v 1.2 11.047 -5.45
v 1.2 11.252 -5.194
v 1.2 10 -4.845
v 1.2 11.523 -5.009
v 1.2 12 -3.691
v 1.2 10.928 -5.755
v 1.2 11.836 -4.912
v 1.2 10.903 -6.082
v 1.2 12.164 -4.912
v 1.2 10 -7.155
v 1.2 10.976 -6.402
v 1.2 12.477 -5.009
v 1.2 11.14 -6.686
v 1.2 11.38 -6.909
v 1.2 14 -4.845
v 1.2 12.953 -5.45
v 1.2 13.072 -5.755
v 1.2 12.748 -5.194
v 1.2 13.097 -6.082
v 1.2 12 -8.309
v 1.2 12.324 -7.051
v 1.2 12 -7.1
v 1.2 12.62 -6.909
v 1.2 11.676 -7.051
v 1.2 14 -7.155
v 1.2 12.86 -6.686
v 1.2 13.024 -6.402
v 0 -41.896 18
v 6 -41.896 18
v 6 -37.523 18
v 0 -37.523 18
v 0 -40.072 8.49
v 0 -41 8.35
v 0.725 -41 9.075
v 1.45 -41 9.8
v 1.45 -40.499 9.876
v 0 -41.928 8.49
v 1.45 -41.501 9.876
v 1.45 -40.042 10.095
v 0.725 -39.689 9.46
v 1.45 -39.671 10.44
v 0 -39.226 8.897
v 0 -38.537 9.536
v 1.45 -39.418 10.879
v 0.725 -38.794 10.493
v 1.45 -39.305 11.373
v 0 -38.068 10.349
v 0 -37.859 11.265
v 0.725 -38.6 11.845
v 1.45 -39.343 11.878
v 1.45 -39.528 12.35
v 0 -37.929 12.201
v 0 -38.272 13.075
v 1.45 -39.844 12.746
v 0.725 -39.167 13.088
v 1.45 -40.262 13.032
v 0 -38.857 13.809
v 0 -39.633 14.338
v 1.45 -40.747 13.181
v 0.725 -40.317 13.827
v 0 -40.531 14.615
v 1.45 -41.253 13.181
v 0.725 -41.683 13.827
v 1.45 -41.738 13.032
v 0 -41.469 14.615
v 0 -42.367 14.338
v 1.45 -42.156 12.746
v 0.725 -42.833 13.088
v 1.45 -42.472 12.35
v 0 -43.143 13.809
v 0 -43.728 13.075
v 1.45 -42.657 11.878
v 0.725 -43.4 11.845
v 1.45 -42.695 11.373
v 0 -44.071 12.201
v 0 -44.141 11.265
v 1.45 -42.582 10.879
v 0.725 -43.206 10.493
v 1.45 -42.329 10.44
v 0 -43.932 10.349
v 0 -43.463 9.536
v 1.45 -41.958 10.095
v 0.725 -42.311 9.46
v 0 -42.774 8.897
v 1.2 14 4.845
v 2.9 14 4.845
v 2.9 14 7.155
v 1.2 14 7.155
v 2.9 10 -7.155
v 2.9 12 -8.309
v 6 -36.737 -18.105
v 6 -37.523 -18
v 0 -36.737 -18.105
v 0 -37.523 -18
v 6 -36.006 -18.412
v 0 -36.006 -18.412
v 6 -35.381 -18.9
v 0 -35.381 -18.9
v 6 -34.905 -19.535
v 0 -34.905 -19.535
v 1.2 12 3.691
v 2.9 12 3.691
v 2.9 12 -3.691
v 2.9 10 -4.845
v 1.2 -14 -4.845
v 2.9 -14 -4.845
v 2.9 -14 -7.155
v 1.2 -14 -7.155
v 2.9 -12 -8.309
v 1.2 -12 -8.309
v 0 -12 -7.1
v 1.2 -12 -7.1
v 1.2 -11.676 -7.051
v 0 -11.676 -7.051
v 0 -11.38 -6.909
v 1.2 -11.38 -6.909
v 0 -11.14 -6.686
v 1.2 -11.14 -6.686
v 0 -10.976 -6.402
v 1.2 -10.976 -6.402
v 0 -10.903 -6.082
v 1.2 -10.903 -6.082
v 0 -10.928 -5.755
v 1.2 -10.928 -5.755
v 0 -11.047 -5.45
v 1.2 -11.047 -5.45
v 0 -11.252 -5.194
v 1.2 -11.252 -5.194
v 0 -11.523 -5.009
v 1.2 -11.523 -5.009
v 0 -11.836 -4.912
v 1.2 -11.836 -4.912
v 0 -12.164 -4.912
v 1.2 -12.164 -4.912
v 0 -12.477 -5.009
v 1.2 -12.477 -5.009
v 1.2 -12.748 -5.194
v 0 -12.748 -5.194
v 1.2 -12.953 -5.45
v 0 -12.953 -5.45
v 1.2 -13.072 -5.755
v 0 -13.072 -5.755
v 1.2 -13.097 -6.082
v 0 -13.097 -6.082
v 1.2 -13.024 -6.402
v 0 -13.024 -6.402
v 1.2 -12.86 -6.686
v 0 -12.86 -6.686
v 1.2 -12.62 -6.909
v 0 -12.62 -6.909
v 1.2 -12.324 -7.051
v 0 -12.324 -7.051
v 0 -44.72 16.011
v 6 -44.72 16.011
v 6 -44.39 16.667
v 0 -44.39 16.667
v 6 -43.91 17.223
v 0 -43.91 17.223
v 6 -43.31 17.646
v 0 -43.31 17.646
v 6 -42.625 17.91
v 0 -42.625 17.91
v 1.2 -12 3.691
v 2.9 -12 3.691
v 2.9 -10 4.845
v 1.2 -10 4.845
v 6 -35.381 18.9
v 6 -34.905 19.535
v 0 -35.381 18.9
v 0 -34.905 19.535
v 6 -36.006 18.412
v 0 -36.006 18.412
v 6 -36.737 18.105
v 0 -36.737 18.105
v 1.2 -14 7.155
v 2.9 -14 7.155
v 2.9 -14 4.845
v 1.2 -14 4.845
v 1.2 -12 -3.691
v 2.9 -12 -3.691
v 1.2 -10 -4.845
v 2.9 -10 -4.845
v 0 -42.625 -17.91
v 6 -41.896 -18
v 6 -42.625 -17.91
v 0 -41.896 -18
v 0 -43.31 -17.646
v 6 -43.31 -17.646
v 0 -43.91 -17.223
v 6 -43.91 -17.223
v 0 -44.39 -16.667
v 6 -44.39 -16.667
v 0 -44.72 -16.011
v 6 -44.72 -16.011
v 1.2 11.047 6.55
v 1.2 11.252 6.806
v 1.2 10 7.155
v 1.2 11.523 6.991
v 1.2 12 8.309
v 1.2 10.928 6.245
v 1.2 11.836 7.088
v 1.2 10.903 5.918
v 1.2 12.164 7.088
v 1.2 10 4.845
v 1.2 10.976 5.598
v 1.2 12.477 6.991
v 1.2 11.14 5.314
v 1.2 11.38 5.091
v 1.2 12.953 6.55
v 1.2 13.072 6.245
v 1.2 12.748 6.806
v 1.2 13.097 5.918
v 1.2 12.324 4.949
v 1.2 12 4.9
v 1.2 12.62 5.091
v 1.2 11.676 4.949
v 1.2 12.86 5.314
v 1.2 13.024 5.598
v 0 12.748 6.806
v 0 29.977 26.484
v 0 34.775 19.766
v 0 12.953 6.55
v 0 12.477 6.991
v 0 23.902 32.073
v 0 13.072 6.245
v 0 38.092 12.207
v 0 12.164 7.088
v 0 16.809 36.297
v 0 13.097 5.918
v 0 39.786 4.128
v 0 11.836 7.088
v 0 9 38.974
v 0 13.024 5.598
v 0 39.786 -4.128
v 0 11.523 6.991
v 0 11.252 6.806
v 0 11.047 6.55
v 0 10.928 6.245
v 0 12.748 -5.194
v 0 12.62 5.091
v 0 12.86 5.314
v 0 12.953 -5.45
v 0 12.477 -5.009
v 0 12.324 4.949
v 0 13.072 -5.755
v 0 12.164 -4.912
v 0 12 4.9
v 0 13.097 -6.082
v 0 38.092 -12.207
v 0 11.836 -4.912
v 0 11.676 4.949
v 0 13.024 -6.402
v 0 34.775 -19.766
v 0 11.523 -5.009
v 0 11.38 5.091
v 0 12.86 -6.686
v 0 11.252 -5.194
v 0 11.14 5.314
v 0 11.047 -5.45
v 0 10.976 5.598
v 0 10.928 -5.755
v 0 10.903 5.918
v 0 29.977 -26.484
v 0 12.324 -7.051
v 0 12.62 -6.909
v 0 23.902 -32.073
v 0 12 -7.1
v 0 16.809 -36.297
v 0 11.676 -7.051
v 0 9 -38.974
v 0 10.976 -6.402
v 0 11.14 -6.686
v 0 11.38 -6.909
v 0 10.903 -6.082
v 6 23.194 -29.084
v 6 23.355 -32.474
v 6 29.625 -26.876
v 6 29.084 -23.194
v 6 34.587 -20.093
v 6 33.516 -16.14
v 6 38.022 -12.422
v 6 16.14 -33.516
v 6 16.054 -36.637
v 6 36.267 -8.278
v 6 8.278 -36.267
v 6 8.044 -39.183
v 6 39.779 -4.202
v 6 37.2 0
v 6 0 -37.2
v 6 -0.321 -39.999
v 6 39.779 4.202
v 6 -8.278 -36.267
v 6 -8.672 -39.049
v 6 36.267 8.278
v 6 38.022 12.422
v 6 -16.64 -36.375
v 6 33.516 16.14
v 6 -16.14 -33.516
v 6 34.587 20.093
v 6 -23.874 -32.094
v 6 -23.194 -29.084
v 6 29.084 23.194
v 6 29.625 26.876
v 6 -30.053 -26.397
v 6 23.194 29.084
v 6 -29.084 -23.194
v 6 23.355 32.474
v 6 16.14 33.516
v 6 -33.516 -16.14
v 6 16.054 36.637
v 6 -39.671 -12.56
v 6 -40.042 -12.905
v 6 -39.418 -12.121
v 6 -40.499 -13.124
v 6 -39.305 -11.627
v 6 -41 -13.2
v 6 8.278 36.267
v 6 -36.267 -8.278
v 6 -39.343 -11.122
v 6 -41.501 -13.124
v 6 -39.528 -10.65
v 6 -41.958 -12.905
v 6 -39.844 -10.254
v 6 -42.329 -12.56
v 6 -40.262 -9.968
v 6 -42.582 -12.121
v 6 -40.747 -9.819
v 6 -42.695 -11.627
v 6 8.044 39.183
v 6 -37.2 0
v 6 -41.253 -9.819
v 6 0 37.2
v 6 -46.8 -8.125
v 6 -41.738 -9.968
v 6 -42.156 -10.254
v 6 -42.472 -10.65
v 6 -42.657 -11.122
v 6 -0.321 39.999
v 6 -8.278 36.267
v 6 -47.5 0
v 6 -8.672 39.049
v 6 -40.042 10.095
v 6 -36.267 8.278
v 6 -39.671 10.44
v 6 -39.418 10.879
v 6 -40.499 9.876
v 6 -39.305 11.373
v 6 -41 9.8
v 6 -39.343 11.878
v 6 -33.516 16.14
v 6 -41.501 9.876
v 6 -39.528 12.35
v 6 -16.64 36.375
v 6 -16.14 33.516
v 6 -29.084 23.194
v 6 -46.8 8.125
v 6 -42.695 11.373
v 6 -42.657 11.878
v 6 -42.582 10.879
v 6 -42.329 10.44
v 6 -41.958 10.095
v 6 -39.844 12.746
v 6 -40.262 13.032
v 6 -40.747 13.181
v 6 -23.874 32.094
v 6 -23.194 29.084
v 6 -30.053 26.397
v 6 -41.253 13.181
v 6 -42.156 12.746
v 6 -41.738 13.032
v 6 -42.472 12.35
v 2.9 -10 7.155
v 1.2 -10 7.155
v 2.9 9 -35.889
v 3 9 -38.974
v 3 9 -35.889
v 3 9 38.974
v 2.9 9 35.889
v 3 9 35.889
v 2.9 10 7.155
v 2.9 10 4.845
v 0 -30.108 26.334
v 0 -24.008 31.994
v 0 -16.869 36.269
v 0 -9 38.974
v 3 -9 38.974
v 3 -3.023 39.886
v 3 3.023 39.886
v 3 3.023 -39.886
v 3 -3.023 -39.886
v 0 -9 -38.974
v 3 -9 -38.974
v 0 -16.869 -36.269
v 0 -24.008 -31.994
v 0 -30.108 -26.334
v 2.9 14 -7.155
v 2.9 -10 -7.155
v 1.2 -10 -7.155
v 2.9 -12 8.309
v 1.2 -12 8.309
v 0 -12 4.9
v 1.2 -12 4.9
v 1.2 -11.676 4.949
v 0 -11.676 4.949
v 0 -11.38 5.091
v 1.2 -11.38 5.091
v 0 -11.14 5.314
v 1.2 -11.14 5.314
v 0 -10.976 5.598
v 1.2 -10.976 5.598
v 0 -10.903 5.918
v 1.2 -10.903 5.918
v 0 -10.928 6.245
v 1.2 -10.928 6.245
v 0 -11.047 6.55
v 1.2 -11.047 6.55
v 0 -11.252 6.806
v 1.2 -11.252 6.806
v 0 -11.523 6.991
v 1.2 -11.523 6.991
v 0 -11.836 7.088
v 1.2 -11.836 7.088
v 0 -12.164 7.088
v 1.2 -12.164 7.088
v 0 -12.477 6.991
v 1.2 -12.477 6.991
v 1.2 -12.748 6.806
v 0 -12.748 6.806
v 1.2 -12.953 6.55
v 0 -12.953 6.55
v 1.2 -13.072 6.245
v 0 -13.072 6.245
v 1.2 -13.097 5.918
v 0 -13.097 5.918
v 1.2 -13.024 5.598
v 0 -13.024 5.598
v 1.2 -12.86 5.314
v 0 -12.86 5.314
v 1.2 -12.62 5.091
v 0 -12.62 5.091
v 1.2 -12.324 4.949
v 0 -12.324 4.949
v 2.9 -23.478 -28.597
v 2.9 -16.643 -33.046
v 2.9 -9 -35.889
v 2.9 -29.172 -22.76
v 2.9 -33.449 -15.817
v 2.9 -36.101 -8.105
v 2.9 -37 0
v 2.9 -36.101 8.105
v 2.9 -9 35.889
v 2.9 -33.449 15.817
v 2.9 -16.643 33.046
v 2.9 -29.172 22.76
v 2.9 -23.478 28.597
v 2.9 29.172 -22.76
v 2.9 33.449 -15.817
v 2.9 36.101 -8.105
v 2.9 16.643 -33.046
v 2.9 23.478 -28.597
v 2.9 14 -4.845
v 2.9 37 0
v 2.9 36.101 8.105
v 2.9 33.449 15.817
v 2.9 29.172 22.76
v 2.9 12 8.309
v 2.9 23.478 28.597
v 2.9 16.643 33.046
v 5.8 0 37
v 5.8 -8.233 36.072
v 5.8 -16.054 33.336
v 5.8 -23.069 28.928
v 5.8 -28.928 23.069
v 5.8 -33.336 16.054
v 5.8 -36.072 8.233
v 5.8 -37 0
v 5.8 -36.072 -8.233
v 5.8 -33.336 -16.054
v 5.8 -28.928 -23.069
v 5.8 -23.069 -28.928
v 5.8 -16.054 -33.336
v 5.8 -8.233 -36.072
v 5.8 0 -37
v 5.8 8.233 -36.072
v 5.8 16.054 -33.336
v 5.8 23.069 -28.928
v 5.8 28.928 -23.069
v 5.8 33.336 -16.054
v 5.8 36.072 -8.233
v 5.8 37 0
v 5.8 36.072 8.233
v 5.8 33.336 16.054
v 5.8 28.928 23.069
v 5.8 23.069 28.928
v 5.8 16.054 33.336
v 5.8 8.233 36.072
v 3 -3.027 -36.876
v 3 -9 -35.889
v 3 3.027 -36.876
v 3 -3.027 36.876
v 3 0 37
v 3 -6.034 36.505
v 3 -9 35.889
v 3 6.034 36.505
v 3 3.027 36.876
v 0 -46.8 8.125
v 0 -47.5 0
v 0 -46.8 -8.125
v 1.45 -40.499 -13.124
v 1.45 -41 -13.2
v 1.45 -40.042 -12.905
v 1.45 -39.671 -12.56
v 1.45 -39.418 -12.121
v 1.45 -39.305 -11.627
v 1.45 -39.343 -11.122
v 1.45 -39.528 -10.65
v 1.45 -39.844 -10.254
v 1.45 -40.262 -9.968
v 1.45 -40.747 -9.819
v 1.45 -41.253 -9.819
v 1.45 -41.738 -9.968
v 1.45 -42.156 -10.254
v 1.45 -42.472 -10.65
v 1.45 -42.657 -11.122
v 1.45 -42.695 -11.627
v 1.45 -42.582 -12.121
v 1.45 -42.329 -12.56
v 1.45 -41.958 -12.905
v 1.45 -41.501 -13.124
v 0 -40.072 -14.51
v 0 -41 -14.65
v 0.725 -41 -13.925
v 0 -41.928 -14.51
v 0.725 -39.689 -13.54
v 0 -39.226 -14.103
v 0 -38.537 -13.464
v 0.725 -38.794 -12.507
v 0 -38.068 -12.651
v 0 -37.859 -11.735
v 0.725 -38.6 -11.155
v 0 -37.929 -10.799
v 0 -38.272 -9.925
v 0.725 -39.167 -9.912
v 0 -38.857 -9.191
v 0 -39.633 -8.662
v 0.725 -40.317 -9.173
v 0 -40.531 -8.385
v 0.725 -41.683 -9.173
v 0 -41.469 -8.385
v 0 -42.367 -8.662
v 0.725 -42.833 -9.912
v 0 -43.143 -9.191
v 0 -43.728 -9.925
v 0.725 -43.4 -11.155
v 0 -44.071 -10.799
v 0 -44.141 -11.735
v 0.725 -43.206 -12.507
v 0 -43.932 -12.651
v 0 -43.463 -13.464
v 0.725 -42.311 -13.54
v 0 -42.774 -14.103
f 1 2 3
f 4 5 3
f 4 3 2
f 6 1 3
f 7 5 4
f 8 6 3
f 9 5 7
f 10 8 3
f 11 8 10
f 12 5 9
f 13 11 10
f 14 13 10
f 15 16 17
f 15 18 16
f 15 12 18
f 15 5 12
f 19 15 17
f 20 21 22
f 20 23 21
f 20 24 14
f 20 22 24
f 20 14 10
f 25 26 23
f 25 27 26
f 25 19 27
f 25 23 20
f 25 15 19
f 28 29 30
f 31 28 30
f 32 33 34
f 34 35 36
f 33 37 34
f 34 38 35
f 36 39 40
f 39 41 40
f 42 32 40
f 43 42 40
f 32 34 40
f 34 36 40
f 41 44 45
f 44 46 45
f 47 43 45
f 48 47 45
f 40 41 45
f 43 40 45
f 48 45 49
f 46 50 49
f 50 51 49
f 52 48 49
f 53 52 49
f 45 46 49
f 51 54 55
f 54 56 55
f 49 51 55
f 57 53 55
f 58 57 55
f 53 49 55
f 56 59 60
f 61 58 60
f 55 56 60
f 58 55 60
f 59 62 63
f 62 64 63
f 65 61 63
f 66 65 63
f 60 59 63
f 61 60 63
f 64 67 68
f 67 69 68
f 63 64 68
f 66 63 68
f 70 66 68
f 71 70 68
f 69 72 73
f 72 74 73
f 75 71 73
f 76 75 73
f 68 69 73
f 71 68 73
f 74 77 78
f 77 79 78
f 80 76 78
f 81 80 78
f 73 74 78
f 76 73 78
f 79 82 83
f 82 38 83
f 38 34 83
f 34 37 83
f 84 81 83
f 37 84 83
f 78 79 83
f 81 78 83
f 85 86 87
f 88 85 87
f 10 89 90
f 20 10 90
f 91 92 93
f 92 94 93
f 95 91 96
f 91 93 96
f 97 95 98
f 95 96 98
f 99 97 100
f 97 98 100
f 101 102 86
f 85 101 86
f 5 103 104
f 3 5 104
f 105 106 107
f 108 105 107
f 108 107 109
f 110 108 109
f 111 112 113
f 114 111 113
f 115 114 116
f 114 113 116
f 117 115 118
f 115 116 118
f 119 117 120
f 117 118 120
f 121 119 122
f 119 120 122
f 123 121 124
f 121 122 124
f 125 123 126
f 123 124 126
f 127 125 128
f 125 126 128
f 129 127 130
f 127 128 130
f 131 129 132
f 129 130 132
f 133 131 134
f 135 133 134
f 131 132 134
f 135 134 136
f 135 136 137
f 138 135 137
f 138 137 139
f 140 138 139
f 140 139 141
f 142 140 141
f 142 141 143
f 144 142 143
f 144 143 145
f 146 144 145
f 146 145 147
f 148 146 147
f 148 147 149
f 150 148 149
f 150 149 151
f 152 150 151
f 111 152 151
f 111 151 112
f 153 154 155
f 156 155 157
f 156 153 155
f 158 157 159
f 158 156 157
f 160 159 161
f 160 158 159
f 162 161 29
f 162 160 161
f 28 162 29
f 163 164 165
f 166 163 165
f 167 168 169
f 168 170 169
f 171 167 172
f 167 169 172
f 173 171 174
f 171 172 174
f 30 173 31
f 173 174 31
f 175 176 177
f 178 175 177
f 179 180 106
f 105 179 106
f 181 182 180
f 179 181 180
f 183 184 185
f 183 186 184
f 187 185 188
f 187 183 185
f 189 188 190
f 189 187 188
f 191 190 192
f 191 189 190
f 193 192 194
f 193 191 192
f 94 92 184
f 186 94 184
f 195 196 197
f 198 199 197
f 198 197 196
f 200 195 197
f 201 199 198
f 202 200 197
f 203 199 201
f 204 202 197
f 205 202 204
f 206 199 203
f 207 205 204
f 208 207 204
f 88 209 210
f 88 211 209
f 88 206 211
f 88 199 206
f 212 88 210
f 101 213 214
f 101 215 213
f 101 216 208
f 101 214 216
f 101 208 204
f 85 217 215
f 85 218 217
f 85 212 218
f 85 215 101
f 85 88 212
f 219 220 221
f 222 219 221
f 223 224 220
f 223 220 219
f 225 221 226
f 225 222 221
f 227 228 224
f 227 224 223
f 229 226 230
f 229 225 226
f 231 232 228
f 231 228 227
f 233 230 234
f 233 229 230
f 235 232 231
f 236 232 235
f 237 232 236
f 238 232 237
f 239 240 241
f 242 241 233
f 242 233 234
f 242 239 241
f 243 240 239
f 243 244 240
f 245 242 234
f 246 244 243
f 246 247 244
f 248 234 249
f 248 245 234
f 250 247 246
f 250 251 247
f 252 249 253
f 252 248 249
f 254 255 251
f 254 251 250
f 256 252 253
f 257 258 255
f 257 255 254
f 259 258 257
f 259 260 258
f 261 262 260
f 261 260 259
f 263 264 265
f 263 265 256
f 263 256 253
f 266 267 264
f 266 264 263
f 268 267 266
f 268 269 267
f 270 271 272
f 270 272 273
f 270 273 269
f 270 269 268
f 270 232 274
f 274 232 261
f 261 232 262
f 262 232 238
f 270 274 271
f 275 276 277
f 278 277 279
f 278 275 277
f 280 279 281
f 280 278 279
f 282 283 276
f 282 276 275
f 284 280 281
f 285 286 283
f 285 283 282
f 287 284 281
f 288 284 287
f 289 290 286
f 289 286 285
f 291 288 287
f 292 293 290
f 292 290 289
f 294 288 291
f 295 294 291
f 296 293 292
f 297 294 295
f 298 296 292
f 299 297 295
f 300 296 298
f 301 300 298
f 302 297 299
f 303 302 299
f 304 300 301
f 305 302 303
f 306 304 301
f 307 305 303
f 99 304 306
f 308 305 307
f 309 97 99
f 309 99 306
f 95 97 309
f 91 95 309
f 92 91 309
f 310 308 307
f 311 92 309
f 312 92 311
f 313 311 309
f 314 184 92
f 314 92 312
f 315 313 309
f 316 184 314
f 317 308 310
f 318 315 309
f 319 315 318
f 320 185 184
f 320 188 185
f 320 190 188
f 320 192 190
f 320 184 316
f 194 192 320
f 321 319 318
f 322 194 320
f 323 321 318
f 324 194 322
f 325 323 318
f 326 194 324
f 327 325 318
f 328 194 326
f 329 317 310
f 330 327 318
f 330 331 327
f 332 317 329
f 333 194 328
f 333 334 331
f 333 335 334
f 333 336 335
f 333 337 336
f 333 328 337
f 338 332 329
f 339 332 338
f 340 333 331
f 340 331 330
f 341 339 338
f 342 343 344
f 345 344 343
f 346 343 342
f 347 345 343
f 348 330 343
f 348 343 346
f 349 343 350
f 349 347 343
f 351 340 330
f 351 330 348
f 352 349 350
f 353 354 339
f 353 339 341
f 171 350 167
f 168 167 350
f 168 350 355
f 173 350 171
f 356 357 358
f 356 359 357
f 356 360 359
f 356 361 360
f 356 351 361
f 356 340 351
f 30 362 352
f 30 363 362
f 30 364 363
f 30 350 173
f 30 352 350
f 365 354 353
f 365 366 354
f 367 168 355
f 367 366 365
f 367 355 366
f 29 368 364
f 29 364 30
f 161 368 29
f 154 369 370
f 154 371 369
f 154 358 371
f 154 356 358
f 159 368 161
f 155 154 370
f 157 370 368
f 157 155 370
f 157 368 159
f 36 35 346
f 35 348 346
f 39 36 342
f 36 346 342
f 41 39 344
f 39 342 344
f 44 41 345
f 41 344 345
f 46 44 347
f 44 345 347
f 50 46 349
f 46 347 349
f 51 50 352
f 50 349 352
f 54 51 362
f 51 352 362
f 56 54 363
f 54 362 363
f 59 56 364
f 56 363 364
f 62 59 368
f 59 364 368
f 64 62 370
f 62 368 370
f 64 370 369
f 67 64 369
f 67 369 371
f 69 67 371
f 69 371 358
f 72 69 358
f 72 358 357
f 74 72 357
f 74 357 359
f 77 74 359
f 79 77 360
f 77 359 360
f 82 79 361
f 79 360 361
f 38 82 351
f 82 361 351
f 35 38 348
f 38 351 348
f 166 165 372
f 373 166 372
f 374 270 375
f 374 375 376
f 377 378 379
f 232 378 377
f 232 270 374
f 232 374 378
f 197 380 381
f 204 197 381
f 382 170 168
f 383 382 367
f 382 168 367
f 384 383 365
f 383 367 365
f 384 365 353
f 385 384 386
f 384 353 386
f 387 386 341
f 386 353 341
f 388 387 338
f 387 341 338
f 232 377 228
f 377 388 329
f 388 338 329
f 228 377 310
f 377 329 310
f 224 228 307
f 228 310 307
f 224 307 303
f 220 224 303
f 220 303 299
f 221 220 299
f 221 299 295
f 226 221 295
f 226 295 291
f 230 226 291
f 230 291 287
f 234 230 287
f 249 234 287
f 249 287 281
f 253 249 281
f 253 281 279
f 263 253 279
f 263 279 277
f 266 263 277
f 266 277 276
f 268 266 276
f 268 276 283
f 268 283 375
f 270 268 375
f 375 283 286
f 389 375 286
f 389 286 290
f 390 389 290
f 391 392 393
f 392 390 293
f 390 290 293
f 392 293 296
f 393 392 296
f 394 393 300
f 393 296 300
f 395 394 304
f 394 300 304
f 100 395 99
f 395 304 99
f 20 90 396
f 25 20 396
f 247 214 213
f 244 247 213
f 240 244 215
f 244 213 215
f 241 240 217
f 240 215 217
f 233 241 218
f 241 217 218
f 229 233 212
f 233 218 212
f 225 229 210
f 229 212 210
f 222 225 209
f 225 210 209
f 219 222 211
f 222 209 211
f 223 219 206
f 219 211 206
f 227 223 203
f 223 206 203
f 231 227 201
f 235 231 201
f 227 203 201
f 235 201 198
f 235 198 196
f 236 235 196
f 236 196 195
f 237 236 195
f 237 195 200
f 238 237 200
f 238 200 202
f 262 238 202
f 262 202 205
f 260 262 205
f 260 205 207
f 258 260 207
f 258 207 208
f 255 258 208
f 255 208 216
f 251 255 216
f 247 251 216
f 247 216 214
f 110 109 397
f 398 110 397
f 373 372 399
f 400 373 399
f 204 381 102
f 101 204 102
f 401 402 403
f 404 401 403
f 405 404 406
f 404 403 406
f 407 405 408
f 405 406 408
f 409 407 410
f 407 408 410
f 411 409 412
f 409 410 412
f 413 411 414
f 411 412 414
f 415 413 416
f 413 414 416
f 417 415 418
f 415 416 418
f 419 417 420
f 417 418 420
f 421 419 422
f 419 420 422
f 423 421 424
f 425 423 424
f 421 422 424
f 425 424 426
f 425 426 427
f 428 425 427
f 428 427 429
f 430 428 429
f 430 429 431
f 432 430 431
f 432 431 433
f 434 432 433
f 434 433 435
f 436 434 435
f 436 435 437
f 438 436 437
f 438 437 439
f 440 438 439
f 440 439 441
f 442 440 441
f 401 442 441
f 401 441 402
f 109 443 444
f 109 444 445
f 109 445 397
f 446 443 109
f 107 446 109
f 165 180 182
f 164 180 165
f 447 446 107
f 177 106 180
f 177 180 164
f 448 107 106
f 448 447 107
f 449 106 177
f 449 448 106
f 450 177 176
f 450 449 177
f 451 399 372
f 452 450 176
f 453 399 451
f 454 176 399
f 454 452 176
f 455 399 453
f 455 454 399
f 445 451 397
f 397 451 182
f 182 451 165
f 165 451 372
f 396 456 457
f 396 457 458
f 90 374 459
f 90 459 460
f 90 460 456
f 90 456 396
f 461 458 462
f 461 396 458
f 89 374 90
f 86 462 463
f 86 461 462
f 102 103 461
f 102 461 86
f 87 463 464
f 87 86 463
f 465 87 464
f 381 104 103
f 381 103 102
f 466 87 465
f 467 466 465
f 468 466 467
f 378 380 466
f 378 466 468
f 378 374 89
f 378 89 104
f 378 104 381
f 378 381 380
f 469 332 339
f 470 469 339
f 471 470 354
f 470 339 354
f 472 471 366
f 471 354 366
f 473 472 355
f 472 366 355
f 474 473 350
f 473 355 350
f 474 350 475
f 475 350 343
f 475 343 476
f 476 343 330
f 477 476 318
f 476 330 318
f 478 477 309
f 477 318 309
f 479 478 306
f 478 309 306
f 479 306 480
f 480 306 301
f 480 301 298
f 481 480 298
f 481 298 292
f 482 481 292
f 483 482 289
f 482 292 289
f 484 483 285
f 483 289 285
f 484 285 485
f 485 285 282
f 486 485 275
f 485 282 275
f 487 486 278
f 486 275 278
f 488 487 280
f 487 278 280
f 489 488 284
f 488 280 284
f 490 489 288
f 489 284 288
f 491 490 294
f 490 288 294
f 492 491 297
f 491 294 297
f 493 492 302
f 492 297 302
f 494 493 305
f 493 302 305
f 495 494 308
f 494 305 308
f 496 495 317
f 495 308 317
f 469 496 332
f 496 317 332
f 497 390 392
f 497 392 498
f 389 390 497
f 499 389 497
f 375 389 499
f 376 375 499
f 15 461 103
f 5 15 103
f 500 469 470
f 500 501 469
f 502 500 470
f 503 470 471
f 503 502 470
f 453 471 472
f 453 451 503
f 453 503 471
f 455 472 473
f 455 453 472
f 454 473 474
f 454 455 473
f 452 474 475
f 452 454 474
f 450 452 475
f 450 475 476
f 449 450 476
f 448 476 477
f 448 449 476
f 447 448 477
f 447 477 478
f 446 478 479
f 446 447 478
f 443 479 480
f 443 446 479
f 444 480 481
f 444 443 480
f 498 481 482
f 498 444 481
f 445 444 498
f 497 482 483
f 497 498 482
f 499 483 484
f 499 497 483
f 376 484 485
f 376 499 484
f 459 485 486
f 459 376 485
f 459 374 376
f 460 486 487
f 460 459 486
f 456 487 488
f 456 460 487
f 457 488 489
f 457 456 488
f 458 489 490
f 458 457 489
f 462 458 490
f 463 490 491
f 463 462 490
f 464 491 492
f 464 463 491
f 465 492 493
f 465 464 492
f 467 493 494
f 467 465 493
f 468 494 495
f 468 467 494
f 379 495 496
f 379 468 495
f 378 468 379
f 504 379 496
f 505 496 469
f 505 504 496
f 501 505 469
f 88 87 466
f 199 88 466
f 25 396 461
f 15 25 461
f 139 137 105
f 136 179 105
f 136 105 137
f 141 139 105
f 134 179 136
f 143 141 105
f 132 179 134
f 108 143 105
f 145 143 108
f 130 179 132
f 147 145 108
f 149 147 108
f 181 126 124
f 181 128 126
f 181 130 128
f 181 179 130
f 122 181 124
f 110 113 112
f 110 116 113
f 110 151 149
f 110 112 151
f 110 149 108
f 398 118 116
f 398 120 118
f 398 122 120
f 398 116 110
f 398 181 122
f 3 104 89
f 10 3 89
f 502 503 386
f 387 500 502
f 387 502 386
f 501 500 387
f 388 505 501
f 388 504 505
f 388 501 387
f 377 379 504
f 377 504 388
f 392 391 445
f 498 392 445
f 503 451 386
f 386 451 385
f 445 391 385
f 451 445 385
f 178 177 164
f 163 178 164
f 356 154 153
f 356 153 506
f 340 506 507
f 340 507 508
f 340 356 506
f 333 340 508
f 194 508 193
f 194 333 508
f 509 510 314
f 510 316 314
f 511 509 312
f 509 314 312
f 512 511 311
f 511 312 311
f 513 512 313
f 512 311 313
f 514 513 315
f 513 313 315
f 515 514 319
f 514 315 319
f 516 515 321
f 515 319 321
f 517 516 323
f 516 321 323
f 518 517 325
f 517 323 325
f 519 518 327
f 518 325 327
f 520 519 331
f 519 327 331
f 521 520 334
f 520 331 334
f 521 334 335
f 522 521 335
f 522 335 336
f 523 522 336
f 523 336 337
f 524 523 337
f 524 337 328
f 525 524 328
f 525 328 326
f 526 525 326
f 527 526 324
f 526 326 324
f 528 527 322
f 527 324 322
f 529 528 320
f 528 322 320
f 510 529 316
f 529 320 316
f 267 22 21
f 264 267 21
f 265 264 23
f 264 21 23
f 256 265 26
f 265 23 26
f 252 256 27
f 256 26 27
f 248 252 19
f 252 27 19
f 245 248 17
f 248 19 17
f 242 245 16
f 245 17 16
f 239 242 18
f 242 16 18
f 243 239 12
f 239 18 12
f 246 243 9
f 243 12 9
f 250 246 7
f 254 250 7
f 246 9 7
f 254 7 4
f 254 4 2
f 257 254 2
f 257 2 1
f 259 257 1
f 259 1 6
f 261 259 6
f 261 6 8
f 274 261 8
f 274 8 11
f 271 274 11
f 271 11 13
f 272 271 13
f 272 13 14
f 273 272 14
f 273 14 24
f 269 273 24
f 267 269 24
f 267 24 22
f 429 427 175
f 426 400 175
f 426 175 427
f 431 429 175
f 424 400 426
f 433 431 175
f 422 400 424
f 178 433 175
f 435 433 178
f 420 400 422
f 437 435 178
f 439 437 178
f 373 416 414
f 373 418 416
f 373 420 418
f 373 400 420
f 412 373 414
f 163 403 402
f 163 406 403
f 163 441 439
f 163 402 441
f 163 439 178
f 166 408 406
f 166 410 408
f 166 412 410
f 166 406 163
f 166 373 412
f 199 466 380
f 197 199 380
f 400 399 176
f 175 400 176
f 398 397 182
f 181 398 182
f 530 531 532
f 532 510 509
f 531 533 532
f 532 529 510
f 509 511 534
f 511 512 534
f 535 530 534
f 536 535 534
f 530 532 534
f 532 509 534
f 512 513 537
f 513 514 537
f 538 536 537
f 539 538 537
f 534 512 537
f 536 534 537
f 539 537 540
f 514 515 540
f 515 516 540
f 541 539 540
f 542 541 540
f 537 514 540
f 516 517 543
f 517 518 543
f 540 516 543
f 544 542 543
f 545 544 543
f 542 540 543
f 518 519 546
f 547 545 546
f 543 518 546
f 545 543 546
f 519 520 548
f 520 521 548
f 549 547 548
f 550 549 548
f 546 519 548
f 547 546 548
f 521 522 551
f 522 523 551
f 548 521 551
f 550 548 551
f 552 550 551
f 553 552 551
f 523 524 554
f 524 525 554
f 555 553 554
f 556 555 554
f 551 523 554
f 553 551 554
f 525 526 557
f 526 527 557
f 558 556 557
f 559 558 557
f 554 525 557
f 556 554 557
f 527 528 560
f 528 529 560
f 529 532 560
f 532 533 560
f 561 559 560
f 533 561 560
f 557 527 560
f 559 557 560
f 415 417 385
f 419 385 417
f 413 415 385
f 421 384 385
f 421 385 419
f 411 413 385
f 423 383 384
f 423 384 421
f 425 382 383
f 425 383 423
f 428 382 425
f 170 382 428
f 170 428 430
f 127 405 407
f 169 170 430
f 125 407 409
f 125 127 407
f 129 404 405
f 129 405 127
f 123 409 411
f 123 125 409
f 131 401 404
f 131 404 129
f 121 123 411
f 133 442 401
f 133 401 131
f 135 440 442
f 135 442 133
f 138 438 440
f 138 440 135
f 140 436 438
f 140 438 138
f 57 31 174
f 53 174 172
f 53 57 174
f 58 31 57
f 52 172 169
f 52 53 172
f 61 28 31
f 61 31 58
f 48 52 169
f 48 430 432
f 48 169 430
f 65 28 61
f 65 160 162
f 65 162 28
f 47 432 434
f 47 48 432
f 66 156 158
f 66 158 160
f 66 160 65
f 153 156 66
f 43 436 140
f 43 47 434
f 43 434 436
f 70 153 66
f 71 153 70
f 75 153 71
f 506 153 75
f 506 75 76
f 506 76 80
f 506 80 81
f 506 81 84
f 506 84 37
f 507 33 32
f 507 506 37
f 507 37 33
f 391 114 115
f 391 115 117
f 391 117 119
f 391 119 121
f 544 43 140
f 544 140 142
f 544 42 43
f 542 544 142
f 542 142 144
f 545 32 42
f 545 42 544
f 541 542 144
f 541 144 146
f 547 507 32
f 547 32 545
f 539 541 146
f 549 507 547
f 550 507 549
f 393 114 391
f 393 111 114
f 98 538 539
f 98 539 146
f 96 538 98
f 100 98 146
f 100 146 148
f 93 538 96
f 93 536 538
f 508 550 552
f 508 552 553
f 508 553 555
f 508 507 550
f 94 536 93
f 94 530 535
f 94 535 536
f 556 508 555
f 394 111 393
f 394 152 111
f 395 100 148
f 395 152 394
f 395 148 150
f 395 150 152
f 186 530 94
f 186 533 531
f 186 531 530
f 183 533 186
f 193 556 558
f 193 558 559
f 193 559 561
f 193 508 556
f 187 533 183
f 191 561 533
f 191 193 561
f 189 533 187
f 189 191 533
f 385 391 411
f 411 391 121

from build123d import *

# Parameters (mm, degrees)
CHAMFER_2_SIZE              = 0.2
CUT_EXTRUDE_START           = -10
CUT_EXTRUDE_1_DEPTH         = 10
HOLE_WIZARD_M31_D           = 3.4
HOLE_WIZARD_M31_CSINK_D     = 6.3
HOLE_WIZARD_M31_CSINK_ANGLE = 90
FILLET_1_R                  = 3
SKETCH_5_W                  = 80
SKETCH_5_H                  = 18
CUT_EXTRUDE_2_DEPTH         = 3
HOLE_WIZARD_M21_D           = 2.2
CUT_EXTRUDE_3_DEPTH         = 1.7


with BuildPart() as part:
    # Эскиз1 → Повернуть1 (revolve)
    with BuildSketch(Plane.XY, mode=Mode.PRIVATE) as revolve_1_sk:
        Polygon((6, 37), (2.9, 37), (2.9, 0), (0, 0), (0, 47.5), (6, 47.5), align=None)
    revolve(revolve_1_sk.sketch.rotate(Axis((-5.881924198, 0, 0), (1, 0, 0)), 90), axis=Axis((-5.881924198, 0, 0), (1, 0, 0)))

    # Фаска2
    chamfer_2_edges = [part.edges().sort_by_distance(p)[0] for p in [
        (6, 0, -37),
    ]]
    chamfer(chamfer_2_edges, length=CHAMFER_2_SIZE)

    # Эскиз2 → Вырез-Вытянуть1 (cut)
    with BuildSketch(Plane.ZY.offset(CUT_EXTRUDE_START)):
        with BuildLine():
            Line((-18, -35.721142199), (-18, -43.957365708))
            ThreePointArc((-18, -43.957365708), (0, 47.5), (18, -43.957365708))
            Line((18, -43.957365708), (18, -35.721142199))
            ThreePointArc((18, -35.721142199), (0, 40), (-18, -35.721142199))
        make_face()
    extrude(amount=CUT_EXTRUDE_1_DEPTH, mode=Mode.SUBTRACT)

    # Зенковка для винта с потайной головкой M31 (through all)
    with Locations(Plane.ZY):
        with Locations((-11.5, -41), (11.5, -41)):
            CounterSinkHole(HOLE_WIZARD_M31_D / 2, HOLE_WIZARD_M31_CSINK_D / 2, counter_sink_angle=HOLE_WIZARD_M31_CSINK_ANGLE)

    # Скругление1
    fillet_1_edges = [part.edges().sort_by_distance(p)[0] for p in [
        (3, -35.721142199, 18),
        (3, -35.721142199, -18),
        (3, -43.957365708, -18),
        (3, -43.957365708, 18),
    ]]
    fillet(fillet_1_edges, radius=FILLET_1_R)

    # Эскиз5 → Вырез-Вытянуть2 (cut)
    with BuildSketch(Plane.ZY):
        Rectangle(SKETCH_5_W, SKETCH_5_H)
    extrude(amount=-CUT_EXTRUDE_2_DEPTH, mode=Mode.SUBTRACT)

    # Отверстие с зазором M21 (through all)
    with Locations(Plane.ZY):
        with Locations((6, 12), (-6, 12), (-6, -12), (6, -12)):
            Hole(HOLE_WIZARD_M21_D / 2)

    # Эскиз8 → Вырез-Вытянуть3 (cut)
    with BuildSketch(Plane(origin=(2.9, 0, 0), x_dir=(0, 0, -1), z_dir=(1, 0, 0))):
        Polygon((7.154700538, 10), (8.309401077, 12), (7.154700538, 14), (4.845299462, 14), (3.690598923, 12), (4.845299462, 10), align=None)
        Polygon((-4.845299462, 10), (-3.690598923, 12), (-4.845299462, 14), (-7.154700538, 14), (-8.309401077, 12), (-7.154700538, 10), align=None)
        Polygon((-4.845299462, -14), (-3.690598923, -12), (-4.845299462, -10), (-7.154700538, -10), (-8.309401077, -12), (-7.154700538, -14), align=None)
        Polygon((7.154700538, -14), (8.309401077, -12), (7.154700538, -10), (4.845299462, -10), (3.690598923, -12), (4.845299462, -14), align=None)
    extrude(amount=-CUT_EXTRUDE_3_DEPTH, mode=Mode.SUBTRACT)


solid = part.part
